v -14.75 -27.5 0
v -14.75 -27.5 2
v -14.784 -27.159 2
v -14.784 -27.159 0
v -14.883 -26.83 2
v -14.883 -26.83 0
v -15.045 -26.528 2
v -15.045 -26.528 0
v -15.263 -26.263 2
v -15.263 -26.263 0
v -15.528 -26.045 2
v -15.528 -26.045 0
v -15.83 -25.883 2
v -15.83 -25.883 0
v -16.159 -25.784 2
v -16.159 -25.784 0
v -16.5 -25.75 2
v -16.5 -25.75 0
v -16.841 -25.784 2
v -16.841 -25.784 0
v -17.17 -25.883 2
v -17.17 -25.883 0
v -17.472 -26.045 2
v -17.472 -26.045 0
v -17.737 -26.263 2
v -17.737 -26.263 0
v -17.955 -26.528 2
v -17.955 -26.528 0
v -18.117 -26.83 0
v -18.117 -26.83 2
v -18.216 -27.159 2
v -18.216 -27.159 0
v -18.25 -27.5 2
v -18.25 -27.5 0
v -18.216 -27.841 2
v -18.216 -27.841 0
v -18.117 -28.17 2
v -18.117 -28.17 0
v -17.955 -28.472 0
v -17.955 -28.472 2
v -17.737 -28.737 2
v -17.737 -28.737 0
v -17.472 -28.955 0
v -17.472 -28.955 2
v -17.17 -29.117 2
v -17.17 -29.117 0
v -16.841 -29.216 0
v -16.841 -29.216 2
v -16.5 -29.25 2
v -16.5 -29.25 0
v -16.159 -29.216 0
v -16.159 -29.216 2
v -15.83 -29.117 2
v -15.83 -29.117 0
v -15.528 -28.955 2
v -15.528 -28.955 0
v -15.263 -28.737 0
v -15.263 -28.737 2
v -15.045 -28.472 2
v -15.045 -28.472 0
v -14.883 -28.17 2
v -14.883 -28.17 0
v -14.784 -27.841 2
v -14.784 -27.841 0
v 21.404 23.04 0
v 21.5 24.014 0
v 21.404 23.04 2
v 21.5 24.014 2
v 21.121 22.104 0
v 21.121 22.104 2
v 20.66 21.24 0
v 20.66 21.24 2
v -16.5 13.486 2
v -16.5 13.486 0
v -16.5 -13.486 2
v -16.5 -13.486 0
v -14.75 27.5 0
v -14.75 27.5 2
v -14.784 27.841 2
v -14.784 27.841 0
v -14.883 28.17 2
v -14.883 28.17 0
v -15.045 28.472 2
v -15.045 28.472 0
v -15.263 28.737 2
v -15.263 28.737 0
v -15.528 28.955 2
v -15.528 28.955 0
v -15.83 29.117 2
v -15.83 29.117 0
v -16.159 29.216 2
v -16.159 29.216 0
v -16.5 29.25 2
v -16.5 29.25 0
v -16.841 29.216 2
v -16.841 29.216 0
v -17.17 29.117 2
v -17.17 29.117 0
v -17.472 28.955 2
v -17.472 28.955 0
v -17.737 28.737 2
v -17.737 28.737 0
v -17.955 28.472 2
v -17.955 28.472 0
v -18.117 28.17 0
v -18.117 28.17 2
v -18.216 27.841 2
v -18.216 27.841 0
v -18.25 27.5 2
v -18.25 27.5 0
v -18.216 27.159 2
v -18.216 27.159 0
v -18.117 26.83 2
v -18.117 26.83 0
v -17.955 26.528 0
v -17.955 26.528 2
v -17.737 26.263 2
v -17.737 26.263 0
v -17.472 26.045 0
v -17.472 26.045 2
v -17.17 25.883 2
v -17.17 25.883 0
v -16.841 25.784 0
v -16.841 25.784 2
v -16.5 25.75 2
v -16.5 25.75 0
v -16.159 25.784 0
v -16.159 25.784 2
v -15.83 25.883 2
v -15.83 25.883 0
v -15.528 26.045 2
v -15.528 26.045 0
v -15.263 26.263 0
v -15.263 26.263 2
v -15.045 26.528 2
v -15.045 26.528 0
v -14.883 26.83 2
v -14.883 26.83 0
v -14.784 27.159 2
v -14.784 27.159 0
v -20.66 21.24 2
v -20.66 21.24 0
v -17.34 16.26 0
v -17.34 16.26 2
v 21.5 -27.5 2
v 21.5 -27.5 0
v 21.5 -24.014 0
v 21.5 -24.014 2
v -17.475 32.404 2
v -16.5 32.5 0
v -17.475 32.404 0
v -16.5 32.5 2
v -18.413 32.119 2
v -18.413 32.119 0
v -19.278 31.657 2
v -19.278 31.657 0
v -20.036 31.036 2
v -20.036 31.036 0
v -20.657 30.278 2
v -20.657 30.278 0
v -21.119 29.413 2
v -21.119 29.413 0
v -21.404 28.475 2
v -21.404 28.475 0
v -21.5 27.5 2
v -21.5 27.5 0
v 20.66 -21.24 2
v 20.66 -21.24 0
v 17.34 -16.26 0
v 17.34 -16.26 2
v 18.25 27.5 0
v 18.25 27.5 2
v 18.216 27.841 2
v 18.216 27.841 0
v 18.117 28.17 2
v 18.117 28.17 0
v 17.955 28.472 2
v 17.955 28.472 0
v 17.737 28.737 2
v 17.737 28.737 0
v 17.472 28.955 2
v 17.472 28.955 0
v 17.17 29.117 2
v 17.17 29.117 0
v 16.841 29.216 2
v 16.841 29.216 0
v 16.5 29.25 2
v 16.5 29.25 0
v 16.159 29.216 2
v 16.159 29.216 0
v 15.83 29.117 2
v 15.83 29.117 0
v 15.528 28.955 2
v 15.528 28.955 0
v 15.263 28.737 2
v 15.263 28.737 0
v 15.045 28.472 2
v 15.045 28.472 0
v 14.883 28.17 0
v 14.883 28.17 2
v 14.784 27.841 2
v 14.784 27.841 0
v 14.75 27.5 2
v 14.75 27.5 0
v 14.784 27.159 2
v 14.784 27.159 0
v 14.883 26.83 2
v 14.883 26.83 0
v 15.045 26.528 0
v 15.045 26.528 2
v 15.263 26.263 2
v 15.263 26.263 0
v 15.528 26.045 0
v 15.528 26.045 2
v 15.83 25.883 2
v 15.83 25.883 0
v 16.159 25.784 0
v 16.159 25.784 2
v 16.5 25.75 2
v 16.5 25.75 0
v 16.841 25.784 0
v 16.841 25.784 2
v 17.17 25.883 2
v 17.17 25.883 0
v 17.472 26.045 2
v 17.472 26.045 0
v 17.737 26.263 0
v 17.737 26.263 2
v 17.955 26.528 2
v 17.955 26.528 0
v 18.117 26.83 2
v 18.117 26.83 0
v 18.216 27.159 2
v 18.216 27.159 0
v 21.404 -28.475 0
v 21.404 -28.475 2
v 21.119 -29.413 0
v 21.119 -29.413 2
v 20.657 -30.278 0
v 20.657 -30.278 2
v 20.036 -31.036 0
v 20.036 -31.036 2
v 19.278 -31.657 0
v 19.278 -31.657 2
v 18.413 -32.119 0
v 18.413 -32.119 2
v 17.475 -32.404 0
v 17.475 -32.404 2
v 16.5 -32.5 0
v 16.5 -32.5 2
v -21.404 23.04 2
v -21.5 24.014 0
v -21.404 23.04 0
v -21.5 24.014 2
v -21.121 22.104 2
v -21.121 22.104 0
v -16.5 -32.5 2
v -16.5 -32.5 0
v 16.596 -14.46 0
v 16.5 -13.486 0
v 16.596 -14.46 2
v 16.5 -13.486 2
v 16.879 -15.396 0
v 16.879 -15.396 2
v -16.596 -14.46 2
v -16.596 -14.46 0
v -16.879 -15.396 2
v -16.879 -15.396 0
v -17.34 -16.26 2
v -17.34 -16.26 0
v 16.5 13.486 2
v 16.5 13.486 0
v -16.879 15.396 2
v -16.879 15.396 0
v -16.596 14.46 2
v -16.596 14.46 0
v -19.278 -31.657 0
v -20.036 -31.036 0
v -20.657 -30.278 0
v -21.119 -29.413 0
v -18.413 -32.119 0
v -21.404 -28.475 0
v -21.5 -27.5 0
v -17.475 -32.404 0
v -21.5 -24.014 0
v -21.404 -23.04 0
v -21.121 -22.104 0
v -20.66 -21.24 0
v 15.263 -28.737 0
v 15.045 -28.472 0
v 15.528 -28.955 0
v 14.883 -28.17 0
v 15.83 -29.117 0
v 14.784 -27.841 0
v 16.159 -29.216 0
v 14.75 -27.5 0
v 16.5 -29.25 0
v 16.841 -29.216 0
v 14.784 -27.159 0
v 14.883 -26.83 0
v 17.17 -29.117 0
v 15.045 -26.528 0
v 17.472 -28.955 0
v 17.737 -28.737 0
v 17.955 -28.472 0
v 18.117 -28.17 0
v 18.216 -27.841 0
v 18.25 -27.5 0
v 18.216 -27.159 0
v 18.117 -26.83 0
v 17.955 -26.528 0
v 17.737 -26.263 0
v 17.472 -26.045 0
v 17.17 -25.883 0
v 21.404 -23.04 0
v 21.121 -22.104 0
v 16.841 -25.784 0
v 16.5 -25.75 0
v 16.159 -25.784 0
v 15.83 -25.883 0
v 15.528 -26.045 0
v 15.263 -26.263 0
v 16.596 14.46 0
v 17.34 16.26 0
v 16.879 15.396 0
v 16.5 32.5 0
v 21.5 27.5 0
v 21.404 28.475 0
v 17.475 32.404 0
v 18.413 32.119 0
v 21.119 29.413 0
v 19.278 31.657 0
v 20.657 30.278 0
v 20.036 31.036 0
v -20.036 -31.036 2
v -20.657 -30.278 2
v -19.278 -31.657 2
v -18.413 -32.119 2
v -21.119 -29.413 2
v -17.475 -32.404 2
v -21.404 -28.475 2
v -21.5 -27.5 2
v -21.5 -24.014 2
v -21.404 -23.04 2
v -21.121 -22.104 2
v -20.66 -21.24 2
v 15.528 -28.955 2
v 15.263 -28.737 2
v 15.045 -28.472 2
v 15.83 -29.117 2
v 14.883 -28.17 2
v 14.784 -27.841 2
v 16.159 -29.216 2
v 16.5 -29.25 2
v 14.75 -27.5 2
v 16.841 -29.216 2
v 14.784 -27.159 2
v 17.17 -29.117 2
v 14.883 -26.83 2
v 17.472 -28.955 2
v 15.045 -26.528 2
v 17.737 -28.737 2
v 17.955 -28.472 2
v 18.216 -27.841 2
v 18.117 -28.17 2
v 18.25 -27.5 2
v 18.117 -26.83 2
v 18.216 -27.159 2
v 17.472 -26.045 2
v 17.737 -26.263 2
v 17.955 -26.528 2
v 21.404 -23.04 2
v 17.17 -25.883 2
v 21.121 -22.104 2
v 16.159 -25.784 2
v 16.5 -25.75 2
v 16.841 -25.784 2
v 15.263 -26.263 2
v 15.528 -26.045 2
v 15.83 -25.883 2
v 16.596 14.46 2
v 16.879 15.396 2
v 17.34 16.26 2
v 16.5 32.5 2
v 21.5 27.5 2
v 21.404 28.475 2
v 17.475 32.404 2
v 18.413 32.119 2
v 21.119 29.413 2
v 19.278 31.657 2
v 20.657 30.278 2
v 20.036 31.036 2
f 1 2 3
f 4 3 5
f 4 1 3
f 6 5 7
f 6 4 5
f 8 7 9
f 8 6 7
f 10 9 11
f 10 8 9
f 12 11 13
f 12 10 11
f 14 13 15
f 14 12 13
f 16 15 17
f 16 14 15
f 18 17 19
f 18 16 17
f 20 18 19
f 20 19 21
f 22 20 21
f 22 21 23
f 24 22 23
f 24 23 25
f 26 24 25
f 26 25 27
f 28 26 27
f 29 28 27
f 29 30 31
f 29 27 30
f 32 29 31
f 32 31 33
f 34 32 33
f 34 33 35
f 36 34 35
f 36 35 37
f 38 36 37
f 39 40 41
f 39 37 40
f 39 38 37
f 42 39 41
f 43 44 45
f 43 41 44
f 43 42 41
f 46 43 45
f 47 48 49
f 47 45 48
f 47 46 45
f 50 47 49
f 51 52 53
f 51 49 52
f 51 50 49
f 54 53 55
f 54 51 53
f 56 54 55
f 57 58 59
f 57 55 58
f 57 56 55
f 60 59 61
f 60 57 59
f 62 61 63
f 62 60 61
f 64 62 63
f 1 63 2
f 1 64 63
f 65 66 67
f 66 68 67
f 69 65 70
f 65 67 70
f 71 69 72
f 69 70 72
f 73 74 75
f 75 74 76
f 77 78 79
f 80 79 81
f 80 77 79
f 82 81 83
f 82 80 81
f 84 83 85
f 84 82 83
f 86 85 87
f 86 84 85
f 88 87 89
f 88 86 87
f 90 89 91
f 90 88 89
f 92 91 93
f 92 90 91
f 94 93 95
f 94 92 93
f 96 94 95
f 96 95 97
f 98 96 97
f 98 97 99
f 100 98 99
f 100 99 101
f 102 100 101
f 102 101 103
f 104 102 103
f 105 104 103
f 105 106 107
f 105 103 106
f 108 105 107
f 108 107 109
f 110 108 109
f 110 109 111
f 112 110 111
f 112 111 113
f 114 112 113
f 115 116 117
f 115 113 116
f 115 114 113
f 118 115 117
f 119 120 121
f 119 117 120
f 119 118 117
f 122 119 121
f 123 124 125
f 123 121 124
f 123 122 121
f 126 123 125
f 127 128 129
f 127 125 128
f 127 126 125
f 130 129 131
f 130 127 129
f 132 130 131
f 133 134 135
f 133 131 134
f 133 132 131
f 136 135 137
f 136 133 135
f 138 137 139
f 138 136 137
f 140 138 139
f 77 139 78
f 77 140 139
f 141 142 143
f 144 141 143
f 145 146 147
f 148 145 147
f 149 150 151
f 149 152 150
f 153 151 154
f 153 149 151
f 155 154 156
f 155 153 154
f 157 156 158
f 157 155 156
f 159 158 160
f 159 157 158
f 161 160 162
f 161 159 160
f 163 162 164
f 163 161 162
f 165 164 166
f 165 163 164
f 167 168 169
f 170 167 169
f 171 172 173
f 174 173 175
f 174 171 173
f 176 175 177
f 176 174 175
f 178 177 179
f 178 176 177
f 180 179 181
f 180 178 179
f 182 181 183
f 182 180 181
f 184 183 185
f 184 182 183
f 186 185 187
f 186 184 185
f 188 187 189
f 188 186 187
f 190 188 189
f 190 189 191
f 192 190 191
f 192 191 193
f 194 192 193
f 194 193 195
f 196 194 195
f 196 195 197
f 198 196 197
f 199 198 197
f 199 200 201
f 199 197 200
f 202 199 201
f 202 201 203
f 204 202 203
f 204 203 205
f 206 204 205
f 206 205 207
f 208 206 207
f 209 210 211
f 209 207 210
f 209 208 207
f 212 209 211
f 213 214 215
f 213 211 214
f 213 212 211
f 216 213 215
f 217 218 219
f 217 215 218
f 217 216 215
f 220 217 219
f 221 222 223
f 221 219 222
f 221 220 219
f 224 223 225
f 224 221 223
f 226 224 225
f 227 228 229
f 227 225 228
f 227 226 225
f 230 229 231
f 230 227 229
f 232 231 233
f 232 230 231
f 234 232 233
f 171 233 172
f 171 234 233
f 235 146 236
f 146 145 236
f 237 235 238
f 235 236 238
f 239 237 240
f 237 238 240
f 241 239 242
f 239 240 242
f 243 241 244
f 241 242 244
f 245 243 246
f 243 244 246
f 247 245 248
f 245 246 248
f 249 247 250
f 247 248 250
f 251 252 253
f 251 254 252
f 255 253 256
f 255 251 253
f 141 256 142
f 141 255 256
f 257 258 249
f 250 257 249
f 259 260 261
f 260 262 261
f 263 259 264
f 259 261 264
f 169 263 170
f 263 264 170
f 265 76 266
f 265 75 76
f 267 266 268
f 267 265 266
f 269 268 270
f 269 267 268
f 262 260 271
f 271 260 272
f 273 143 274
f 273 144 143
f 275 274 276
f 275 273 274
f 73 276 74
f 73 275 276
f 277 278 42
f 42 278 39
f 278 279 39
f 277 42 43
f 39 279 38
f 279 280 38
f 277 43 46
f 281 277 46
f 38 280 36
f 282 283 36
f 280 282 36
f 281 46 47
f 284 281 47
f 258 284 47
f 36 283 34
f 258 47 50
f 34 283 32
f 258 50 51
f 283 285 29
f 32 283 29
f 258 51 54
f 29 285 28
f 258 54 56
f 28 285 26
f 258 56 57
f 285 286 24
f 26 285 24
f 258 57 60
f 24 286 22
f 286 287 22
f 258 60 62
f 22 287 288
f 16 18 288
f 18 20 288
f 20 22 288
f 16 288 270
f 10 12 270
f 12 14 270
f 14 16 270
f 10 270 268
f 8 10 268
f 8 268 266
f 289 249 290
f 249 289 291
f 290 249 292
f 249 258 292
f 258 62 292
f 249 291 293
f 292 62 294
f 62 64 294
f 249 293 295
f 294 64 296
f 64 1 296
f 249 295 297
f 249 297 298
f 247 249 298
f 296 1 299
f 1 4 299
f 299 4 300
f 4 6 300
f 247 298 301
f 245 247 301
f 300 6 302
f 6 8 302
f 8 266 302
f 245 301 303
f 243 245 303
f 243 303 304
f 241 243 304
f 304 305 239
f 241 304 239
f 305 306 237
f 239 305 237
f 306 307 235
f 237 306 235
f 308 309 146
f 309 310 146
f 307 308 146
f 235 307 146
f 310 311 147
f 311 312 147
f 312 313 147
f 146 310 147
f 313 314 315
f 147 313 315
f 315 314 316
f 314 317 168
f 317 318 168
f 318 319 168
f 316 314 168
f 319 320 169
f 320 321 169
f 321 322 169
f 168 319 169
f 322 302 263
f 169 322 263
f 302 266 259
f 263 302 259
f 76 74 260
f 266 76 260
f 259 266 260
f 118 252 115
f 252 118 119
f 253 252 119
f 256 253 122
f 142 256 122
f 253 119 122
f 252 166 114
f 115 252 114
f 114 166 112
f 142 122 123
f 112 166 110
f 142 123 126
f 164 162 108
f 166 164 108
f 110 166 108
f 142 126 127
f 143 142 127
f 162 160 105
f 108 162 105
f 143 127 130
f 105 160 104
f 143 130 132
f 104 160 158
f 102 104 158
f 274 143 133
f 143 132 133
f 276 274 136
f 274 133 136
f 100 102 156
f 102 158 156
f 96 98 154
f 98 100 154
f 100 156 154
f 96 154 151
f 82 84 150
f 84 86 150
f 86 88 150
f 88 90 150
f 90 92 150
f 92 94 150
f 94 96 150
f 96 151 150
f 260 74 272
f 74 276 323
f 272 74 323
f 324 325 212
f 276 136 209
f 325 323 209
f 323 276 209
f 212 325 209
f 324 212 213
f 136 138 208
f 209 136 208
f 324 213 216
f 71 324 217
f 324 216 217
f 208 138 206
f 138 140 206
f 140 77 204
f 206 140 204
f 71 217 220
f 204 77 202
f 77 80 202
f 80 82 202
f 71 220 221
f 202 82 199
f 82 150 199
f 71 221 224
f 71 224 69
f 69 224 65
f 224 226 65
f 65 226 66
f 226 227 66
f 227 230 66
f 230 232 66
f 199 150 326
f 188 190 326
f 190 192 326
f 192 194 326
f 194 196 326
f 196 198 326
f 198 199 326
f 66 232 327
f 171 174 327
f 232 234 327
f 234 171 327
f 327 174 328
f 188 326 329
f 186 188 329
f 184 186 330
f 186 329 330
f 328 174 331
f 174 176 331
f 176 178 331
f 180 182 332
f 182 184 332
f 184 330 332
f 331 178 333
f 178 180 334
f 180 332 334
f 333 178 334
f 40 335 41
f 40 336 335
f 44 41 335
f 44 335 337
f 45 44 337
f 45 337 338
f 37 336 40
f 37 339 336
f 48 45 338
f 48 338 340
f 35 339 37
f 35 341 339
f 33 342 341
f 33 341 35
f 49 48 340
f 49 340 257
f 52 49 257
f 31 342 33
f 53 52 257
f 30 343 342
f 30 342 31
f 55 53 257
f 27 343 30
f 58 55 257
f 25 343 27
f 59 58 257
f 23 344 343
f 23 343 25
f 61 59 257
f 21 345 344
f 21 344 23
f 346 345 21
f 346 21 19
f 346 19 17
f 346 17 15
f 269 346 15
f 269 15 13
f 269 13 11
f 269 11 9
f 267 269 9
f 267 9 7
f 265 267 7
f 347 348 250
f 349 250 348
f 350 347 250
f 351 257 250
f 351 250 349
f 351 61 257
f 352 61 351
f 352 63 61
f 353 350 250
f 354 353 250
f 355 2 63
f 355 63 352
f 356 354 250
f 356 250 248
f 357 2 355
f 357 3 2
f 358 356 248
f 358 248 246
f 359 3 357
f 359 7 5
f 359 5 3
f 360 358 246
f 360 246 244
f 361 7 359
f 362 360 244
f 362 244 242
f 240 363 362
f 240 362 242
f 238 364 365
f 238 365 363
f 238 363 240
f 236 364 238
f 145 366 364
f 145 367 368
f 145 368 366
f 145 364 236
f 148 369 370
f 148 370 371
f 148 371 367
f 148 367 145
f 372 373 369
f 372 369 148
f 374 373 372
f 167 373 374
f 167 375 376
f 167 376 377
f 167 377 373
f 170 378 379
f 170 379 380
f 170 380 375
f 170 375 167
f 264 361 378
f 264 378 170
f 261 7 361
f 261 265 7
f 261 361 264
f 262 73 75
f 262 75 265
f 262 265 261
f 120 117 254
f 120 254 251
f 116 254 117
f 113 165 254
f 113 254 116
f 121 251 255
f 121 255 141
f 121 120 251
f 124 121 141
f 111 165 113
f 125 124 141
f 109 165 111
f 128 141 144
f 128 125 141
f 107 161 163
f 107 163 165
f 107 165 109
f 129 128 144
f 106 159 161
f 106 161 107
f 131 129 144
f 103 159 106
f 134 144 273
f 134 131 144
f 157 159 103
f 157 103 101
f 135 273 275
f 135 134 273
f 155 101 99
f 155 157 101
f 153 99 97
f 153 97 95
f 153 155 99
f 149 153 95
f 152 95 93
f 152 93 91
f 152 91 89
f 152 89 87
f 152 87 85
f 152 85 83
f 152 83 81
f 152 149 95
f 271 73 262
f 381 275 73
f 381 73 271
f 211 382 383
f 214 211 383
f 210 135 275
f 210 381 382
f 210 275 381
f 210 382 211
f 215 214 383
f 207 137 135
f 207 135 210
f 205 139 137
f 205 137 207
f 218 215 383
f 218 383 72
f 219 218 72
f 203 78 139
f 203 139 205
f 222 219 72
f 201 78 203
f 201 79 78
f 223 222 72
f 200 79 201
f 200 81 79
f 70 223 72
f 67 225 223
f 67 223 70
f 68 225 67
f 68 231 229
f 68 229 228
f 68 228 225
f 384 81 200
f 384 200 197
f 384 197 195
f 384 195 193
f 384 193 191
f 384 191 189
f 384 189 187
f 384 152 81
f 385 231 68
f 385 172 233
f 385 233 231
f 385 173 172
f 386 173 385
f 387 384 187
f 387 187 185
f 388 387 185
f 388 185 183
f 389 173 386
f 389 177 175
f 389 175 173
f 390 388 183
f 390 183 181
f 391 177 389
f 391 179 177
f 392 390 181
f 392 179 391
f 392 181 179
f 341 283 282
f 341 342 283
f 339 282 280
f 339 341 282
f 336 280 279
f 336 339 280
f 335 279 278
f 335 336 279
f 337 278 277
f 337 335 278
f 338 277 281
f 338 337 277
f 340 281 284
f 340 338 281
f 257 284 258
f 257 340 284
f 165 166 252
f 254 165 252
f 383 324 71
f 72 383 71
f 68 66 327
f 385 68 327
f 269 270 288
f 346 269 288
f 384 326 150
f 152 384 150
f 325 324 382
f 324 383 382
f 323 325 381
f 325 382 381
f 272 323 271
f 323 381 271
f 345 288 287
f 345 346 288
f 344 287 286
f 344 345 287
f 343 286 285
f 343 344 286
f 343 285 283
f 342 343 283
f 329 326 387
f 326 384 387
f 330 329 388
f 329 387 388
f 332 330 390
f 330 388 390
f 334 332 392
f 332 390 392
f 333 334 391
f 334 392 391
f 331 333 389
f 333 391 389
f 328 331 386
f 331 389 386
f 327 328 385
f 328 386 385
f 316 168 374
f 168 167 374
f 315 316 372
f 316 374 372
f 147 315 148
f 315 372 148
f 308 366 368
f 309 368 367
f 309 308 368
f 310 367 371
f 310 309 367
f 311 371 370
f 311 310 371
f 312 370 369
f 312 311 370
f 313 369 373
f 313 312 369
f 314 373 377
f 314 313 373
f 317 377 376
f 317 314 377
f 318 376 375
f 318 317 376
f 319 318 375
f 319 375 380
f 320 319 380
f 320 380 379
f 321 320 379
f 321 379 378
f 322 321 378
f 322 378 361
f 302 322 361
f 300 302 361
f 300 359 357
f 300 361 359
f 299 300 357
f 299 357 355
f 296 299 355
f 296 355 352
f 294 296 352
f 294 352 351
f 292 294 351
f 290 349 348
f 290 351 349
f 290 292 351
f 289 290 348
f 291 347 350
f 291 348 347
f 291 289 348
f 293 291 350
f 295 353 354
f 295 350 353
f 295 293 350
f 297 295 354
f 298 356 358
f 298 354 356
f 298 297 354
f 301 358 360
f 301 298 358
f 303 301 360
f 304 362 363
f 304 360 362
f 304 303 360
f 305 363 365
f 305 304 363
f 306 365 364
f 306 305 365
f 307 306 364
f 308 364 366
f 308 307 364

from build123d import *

# Parameters (mm, degrees)
F1_DEPTH = 2
F2_R     = 1.75
F3_DEPTH = 25
F4_R     = 5


with BuildPart() as f1:
    # F0 (on Top) → F1 (new body)
    with BuildSketch(Plane.XY):
        Polygon((21.5, 32.5), (-21.5, 32.5), (-21.5, 22.5), (-16.5, 15), (-16.5, -15), (-21.5, -22.5), (-21.5, -32.5), (21.5, -32.5), (21.5, -22.5), (16.5, -15), (16.5, 15), (21.5, 22.5), align=None)
    extrude(amount=F1_DEPTH)

    # F2 (on Top) → F3 (cut)
    with BuildSketch(Plane.XY):
        with Locations((-16.5, 27.5)):
            Circle(F2_R)
        with Locations((16.5, 27.5)):
            Circle(F2_R)
        with Locations((16.5, -27.5)):
            Circle(F2_R)
        with Locations((-16.5, -27.5)):
            Circle(F2_R)
    extrude(amount=F3_DEPTH, mode=Mode.SUBTRACT)

    # F4
    f4_edges = [f1.edges().sort_by_distance(p)[0] for p in [
        (-21.5, 32.5, 1),
        (21.5, 32.5, 1),
        (21.5, -32.5, 1),
        (-21.5, -32.5, 1),
        (21.5, 22.5, 1),
        (16.5, 15, 1),
        (16.5, -15, 1),
        (21.5, -22.5, 1),
        (-21.5, -22.5, 1),
        (-16.5, -15, 1),
        (-16.5, 15, 1),
        (-21.5, 22.5, 1),
    ]]
    fillet(f4_edges, radius=F4_R)


solid = f1.part
